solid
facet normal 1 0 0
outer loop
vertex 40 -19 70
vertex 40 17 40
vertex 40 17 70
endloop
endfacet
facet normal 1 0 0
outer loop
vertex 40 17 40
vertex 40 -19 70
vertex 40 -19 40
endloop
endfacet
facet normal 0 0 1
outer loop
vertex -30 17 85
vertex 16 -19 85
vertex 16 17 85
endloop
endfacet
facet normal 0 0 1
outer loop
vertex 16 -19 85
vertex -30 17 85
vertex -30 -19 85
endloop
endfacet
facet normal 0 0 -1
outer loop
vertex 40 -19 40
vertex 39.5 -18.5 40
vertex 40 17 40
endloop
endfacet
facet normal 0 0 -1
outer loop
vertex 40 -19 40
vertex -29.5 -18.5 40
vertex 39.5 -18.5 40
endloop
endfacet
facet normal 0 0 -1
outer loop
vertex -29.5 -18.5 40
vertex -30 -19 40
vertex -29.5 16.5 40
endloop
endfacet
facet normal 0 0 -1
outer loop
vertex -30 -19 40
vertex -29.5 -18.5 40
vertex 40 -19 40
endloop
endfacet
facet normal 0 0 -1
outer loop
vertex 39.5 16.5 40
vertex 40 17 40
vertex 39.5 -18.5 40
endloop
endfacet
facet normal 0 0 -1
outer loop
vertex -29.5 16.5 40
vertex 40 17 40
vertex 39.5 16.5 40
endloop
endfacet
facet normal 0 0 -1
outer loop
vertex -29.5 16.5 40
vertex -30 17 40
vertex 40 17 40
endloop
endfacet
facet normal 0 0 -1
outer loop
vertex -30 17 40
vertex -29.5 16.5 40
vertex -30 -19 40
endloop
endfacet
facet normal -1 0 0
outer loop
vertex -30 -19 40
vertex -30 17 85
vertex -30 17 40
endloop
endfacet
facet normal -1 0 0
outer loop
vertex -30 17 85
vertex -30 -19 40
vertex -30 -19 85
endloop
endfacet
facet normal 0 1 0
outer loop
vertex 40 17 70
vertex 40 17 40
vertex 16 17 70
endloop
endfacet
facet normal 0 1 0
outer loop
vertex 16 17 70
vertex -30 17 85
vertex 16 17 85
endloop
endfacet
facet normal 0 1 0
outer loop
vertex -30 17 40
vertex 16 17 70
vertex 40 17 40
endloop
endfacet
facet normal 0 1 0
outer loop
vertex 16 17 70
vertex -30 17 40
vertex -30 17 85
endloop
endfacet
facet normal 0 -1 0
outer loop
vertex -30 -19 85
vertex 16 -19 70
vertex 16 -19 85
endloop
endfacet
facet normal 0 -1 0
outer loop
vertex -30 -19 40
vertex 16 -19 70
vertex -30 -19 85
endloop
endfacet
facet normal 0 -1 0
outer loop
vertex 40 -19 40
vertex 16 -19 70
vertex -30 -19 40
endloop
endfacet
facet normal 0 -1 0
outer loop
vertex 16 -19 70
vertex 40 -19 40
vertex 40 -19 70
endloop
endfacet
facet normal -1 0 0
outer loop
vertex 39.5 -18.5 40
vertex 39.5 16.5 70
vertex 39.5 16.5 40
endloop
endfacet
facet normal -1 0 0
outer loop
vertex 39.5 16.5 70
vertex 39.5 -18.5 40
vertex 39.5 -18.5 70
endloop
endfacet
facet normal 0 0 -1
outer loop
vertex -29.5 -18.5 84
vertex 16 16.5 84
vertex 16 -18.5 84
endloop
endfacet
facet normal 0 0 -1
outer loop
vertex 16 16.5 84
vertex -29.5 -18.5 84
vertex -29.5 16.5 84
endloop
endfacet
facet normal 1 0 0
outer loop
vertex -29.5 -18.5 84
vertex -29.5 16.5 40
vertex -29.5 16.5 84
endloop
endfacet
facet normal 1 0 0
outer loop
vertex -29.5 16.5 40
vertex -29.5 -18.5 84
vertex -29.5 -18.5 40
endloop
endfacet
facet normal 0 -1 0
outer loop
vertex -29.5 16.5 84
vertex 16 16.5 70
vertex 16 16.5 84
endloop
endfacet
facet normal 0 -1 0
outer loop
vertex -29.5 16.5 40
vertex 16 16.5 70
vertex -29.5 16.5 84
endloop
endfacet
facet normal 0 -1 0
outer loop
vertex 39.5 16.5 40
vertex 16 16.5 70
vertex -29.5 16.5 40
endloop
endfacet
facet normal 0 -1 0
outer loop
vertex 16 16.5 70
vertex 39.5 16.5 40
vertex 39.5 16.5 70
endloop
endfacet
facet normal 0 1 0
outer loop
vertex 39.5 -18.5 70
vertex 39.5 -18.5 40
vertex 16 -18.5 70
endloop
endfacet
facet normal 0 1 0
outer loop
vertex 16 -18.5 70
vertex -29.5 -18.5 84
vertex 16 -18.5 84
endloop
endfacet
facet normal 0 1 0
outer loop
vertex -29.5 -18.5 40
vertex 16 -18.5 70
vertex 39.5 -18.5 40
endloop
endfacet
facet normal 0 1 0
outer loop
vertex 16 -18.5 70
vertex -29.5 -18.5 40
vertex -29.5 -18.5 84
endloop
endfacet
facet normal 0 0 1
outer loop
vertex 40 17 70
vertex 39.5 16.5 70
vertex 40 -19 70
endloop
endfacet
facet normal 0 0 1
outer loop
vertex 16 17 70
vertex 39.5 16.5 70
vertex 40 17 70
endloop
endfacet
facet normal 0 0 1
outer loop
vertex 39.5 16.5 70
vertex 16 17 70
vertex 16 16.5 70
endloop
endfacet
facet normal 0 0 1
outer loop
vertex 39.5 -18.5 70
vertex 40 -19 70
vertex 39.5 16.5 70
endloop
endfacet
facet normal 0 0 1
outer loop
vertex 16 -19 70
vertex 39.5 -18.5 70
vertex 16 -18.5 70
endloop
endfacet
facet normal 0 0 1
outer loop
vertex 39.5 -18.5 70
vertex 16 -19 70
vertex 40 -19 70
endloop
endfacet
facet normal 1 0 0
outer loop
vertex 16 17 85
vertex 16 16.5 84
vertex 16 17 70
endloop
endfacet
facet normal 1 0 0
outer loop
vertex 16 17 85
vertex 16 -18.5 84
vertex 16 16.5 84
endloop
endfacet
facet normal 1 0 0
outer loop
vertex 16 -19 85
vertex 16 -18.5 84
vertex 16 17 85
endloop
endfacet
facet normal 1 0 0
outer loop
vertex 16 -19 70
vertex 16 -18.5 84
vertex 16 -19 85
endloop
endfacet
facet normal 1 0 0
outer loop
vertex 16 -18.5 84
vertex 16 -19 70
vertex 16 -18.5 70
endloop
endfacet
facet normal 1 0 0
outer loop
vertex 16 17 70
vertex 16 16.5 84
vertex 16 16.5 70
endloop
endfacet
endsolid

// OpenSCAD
//referenceCube();
//fakeCounter();
translate([0, 0, 41]) closedBeerCan();
translate([20, 0, 41]) openBeerCan();
translate([0, 0, 41]) beerCanBox();

showCanOpened = false;
showCanClosed = false;
showPaintedParts = false;
showAluminumParts = false;
showFoam = false;
showCanBox = true;

module beerCanBox() {
    if (showCanBox) {
        if (showCanClosed) {
            //translate([11, 15, 38]) rotate([90, 0, 0]) closedBeerCan();
            translate([17, 15, 37]) rotate([90, 0, 0]) closedBeerCan();
            translate([28, 15, 37]) rotate([90, 0, 0]) closedBeerCan();
            
            translate([-22, 15, 27]) rotate([90, 0, 0]) closedBeerCan();
            translate([-11, 15, 27]) rotate([90, 0, 0]) closedBeerCan();
            translate([0, 15, 27]) rotate([90, 0, 0]) closedBeerCan();
            translate([11, 15, 27]) rotate([90, 0, 0]) closedBeerCan();
            translate([22, 15, 27]) rotate([90, 0, 0]) closedBeerCan();
            translate([33, 15, 27]) rotate([90, 0, 0]) closedBeerCan();
        } else {
            
        }
        color("white")
        translate([-30, -19, -1])
        difference() {
            cube([70, 36, 45]);
            translate([0.5, 0.5, 0])
            cube([69, 35, 44]);
            translate([46, -0.5, 30])
            cube([25, 37, 44]);
        }
        
        
        
        
        


    }
}

module closedBeerCan() {
    canBottom();
    canSideWall();
    canTopClosed();  
}

module openBeerCan() {
    if (showCanOpened) {
        canBottom();
        canSideWall();
        canTopOpen();
        canOpenFoam();
    }
}

module canBottom() {
    if (showAluminumParts) {
        cylinder(d1=10, d2=11, h=1, $fn=50);
    }
}

module canTopClosed() {
    if (showAluminumParts && showCanClosed) {
        translate([0, 0, 30])
        cylinder(d2=10, d1=11, h=1.5, $fn=50);
        
        translate([0, 0, 31.5])
        difference() {
            color("blue")
            cylinder(d=10, h=0.5, $fn=50);
            
            translate([0, 0, -1])
            cylinder(d=9, h=2, $fn=50);
        }
        
        translate([-3/2, 0, 31.5])
        cube([3, 4, 0.5]);
    }
}

module canTopOpen() {
    if (showAluminumParts && showCanOpened) {
        translate([0, 0, 30])
        cylinder(d2=10, d1=11, h=1.5, $fn=50);
        
        translate([0, 0, 31.5])
        difference() {
            color("blue")
            cylinder(d=10, h=0.5, $fn=50);
            
            translate([0, 0, -1])
            cylinder(d=9, h=2, $fn=50);
        }
        
        translate([-3/2, 0, 31.5])
        rotate([90, 0, 0])
        cube([3, 4, 0.5]);
    }
}

module canOpenFoam() {
    if (showFoam) { 
        intersection() {
            union() {
                //translate([0, -7, 28])
                //sphere(d=13);
                
                translate([0, -2, 0])
                cylinder(d=11.1, h=32.5);
                
            }
        
            cylinder(d1=9, d2=15, h=50);
        }
    }
}

module canSideWall() {
    if (showPaintedParts) {
        translate([0, 0, 1])
        cylinder(d=11, h=29.0, $fn=50);
    }
}

module fakeCounter() {
    translate([-50, -50, 0])
    cube([100, 100, 40]);
}

module referenceCube() {
    translate([-50, -200, 0])
    cube([100, 100, 100]);
}
